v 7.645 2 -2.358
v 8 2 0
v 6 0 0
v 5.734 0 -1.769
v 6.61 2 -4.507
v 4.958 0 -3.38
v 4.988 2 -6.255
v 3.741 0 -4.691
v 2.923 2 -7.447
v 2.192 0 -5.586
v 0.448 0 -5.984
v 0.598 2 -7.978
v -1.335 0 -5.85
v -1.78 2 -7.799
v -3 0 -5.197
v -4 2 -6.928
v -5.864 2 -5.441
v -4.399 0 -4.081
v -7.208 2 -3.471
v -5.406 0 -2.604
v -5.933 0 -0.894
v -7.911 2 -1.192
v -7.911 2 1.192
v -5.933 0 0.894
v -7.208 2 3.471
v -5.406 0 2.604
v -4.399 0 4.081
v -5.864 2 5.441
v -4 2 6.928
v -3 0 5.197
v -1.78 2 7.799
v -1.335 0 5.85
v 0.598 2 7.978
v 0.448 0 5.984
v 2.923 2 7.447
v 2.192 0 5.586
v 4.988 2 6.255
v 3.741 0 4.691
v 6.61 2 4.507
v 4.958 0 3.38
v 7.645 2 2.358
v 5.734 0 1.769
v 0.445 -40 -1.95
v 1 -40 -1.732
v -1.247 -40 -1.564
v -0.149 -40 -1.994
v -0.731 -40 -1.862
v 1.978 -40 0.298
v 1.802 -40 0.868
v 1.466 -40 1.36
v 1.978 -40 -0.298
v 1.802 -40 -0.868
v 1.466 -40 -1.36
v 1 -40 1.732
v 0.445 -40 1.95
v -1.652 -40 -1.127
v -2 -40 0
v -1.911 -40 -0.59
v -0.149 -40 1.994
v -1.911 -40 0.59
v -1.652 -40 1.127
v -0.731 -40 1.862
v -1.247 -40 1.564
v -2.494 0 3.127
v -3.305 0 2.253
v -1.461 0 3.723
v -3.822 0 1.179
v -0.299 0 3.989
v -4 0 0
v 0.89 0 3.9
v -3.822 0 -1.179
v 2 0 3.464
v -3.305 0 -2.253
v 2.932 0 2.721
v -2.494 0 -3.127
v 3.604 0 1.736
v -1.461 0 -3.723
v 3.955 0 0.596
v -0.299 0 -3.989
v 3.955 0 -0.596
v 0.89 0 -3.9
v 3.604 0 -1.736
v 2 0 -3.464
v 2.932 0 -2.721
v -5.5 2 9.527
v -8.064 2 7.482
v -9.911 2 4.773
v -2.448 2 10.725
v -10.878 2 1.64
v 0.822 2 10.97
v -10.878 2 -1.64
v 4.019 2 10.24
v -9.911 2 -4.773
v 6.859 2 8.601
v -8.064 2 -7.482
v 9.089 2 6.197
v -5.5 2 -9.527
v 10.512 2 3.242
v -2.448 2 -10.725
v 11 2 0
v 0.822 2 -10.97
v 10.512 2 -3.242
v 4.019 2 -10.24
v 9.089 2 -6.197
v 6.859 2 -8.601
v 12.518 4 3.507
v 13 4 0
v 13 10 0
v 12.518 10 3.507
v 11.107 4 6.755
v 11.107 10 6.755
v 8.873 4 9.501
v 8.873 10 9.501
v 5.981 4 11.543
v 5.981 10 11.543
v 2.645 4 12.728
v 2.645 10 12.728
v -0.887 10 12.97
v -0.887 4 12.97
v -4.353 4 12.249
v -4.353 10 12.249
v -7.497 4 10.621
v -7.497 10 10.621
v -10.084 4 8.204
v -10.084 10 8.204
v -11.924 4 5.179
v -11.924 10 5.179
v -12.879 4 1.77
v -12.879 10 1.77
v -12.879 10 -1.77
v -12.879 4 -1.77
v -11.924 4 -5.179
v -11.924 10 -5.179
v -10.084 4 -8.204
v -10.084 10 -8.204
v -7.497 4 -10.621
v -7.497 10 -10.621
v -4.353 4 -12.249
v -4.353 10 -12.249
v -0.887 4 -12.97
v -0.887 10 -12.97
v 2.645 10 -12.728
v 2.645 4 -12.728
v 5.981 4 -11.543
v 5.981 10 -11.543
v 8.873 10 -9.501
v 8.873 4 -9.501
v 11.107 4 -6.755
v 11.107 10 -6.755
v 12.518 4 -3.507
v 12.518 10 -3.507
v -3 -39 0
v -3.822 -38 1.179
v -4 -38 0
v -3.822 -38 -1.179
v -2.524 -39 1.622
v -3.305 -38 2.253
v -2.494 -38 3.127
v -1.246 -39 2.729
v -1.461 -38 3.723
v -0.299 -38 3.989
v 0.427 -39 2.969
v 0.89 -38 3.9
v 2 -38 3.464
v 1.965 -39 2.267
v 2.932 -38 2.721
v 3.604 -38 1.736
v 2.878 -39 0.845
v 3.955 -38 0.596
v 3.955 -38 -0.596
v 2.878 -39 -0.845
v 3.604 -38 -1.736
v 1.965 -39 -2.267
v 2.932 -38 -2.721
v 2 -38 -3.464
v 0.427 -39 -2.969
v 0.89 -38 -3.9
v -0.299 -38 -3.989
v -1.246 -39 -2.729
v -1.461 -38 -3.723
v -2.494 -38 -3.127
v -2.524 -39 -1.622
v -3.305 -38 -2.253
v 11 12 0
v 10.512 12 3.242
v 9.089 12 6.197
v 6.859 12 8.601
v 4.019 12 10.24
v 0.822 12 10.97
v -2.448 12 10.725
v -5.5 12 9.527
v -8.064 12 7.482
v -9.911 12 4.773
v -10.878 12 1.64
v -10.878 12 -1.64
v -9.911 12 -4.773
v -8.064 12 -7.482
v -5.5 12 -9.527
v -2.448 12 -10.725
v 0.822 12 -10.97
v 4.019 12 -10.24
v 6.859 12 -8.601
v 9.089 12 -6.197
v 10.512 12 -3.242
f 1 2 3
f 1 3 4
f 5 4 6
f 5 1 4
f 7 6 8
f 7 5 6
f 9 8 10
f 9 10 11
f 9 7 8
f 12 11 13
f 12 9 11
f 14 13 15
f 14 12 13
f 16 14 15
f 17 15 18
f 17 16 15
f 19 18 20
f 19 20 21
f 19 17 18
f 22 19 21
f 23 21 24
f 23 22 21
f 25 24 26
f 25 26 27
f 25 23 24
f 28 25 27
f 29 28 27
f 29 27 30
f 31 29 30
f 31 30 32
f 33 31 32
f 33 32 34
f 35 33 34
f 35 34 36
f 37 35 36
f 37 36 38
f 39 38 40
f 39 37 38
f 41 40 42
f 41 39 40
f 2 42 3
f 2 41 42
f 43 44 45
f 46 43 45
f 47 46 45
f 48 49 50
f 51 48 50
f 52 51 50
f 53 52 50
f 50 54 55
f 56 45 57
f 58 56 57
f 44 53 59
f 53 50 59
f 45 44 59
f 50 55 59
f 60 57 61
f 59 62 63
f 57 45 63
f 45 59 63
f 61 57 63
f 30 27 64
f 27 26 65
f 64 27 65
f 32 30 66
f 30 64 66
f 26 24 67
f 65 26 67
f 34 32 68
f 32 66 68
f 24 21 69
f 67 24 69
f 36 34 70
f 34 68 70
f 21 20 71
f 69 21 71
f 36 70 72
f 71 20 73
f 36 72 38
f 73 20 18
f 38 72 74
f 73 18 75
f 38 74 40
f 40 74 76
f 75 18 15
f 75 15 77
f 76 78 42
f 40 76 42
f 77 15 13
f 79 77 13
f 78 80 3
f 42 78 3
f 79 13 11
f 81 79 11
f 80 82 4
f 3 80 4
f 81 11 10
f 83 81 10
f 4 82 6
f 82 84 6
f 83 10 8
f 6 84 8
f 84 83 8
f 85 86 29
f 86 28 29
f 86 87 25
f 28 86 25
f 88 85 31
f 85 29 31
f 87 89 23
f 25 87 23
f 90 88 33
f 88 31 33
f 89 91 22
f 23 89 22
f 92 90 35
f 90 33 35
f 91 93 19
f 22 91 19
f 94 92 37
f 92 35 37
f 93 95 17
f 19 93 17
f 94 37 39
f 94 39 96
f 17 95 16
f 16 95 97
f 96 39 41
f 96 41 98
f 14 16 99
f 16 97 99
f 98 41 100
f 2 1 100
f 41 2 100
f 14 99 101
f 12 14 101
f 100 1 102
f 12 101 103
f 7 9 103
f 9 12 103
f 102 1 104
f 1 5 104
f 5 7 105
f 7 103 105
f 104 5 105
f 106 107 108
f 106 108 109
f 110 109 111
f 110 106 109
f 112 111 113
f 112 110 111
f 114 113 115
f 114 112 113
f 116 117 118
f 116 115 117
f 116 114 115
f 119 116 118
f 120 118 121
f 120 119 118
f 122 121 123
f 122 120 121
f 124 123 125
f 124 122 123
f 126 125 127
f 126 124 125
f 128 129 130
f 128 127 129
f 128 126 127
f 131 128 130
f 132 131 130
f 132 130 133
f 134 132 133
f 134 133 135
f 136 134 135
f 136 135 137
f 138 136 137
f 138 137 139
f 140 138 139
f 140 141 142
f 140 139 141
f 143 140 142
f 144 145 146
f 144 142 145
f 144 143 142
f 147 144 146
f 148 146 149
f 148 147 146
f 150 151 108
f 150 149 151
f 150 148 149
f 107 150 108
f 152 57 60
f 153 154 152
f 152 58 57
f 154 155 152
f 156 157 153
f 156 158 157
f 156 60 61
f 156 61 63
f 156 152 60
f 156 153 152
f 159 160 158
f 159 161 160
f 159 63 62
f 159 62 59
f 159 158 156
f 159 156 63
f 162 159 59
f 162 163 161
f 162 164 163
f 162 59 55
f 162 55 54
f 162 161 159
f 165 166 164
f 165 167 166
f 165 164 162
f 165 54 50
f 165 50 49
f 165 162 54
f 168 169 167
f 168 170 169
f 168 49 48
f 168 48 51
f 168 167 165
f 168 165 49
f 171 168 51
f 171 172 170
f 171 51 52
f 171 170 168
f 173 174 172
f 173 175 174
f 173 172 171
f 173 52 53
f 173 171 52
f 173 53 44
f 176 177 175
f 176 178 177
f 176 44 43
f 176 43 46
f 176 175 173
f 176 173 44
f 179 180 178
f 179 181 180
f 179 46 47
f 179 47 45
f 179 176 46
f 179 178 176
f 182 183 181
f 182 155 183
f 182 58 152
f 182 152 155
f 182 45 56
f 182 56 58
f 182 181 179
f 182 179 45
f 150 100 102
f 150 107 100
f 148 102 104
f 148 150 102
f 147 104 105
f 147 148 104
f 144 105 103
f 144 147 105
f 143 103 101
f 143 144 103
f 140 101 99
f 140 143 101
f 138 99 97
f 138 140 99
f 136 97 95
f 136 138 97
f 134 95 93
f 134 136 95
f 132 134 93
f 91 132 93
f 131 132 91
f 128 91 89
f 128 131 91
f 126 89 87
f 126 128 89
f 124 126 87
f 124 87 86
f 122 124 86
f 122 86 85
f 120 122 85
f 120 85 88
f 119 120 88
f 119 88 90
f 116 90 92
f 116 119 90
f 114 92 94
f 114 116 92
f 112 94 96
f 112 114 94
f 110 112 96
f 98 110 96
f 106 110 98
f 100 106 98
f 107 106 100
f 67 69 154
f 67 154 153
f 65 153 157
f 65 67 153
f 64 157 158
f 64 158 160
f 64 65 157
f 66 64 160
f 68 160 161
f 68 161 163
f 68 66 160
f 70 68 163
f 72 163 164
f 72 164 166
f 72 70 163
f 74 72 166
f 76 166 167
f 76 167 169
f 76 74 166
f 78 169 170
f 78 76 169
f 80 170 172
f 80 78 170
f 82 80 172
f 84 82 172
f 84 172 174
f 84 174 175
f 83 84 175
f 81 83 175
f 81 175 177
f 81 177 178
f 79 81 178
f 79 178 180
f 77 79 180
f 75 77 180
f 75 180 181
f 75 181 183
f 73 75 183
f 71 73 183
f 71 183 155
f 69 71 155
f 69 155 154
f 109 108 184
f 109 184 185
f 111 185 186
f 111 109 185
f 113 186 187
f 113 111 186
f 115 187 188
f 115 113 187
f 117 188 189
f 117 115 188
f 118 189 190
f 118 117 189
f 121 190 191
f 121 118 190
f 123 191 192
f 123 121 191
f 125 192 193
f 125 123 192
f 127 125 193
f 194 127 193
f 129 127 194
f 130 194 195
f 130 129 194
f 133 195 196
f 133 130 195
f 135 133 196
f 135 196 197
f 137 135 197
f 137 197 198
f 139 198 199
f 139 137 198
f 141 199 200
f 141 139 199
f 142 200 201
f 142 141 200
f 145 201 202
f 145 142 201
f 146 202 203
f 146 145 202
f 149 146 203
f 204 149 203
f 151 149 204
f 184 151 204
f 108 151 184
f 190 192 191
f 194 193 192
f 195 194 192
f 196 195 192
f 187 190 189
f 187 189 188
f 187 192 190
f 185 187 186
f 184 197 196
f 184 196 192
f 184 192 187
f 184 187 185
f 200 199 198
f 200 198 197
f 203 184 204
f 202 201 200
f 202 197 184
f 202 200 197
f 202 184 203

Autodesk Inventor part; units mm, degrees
ref_plane "YZ Plane" through (0, 0, 0) normal (1, 0, 0) x (0, 1, 0)
ref_plane "XZ Plane" through (0, 0, 0) normal (0, 1, 0) x (-1, 0, 0)
ref_plane "XY Plane" through (0, 0, 0) normal (0, 0, 1) x (1, 0, 0)
sketch "Body Cross Section" plane through (0, 0, 0) normal (0, 1, 0) x (-1, 0, 0)
  circle A0 centre (0, 0) radius 4
  dimension "d0" = 8
extrude "Body" add sketch "Body Cross Section" against normal blind 40
sketch "Base Cross Section" plane through (0, 0, 0) normal (0, 1, 0) x (1, 0, 0)
  circle A0 centre (0, 0) radius 8
  dimension "d3" = 16
extrude "Base" add sketch "Base Cross Section" along normal blind 2
sketch "Head Cross Section" plane through (0, 2, 0) normal (0, 1, 0) x (1, 0, 0)
  circle A0 centre (0, 0) radius 13
  dimension "d6" = 26
extrude "Head" add sketch "Head Cross Section" along normal blind 10
thread "Thread" size "M8x1.25" class "6g" standard "ANSI Metric M Profile" full length
chamfer "Body Chamfer" distance 2 angle 45 1 edges at (4, -40, 0)
chamfer "Head Chamfer" distance 2 angle 45 3 edges at (-13, 12, 0) (-13, 2, 0) (-8, 0, 0)
properties part number "P0480.080-040-A4" material "Stainless Steel AISI 317"
